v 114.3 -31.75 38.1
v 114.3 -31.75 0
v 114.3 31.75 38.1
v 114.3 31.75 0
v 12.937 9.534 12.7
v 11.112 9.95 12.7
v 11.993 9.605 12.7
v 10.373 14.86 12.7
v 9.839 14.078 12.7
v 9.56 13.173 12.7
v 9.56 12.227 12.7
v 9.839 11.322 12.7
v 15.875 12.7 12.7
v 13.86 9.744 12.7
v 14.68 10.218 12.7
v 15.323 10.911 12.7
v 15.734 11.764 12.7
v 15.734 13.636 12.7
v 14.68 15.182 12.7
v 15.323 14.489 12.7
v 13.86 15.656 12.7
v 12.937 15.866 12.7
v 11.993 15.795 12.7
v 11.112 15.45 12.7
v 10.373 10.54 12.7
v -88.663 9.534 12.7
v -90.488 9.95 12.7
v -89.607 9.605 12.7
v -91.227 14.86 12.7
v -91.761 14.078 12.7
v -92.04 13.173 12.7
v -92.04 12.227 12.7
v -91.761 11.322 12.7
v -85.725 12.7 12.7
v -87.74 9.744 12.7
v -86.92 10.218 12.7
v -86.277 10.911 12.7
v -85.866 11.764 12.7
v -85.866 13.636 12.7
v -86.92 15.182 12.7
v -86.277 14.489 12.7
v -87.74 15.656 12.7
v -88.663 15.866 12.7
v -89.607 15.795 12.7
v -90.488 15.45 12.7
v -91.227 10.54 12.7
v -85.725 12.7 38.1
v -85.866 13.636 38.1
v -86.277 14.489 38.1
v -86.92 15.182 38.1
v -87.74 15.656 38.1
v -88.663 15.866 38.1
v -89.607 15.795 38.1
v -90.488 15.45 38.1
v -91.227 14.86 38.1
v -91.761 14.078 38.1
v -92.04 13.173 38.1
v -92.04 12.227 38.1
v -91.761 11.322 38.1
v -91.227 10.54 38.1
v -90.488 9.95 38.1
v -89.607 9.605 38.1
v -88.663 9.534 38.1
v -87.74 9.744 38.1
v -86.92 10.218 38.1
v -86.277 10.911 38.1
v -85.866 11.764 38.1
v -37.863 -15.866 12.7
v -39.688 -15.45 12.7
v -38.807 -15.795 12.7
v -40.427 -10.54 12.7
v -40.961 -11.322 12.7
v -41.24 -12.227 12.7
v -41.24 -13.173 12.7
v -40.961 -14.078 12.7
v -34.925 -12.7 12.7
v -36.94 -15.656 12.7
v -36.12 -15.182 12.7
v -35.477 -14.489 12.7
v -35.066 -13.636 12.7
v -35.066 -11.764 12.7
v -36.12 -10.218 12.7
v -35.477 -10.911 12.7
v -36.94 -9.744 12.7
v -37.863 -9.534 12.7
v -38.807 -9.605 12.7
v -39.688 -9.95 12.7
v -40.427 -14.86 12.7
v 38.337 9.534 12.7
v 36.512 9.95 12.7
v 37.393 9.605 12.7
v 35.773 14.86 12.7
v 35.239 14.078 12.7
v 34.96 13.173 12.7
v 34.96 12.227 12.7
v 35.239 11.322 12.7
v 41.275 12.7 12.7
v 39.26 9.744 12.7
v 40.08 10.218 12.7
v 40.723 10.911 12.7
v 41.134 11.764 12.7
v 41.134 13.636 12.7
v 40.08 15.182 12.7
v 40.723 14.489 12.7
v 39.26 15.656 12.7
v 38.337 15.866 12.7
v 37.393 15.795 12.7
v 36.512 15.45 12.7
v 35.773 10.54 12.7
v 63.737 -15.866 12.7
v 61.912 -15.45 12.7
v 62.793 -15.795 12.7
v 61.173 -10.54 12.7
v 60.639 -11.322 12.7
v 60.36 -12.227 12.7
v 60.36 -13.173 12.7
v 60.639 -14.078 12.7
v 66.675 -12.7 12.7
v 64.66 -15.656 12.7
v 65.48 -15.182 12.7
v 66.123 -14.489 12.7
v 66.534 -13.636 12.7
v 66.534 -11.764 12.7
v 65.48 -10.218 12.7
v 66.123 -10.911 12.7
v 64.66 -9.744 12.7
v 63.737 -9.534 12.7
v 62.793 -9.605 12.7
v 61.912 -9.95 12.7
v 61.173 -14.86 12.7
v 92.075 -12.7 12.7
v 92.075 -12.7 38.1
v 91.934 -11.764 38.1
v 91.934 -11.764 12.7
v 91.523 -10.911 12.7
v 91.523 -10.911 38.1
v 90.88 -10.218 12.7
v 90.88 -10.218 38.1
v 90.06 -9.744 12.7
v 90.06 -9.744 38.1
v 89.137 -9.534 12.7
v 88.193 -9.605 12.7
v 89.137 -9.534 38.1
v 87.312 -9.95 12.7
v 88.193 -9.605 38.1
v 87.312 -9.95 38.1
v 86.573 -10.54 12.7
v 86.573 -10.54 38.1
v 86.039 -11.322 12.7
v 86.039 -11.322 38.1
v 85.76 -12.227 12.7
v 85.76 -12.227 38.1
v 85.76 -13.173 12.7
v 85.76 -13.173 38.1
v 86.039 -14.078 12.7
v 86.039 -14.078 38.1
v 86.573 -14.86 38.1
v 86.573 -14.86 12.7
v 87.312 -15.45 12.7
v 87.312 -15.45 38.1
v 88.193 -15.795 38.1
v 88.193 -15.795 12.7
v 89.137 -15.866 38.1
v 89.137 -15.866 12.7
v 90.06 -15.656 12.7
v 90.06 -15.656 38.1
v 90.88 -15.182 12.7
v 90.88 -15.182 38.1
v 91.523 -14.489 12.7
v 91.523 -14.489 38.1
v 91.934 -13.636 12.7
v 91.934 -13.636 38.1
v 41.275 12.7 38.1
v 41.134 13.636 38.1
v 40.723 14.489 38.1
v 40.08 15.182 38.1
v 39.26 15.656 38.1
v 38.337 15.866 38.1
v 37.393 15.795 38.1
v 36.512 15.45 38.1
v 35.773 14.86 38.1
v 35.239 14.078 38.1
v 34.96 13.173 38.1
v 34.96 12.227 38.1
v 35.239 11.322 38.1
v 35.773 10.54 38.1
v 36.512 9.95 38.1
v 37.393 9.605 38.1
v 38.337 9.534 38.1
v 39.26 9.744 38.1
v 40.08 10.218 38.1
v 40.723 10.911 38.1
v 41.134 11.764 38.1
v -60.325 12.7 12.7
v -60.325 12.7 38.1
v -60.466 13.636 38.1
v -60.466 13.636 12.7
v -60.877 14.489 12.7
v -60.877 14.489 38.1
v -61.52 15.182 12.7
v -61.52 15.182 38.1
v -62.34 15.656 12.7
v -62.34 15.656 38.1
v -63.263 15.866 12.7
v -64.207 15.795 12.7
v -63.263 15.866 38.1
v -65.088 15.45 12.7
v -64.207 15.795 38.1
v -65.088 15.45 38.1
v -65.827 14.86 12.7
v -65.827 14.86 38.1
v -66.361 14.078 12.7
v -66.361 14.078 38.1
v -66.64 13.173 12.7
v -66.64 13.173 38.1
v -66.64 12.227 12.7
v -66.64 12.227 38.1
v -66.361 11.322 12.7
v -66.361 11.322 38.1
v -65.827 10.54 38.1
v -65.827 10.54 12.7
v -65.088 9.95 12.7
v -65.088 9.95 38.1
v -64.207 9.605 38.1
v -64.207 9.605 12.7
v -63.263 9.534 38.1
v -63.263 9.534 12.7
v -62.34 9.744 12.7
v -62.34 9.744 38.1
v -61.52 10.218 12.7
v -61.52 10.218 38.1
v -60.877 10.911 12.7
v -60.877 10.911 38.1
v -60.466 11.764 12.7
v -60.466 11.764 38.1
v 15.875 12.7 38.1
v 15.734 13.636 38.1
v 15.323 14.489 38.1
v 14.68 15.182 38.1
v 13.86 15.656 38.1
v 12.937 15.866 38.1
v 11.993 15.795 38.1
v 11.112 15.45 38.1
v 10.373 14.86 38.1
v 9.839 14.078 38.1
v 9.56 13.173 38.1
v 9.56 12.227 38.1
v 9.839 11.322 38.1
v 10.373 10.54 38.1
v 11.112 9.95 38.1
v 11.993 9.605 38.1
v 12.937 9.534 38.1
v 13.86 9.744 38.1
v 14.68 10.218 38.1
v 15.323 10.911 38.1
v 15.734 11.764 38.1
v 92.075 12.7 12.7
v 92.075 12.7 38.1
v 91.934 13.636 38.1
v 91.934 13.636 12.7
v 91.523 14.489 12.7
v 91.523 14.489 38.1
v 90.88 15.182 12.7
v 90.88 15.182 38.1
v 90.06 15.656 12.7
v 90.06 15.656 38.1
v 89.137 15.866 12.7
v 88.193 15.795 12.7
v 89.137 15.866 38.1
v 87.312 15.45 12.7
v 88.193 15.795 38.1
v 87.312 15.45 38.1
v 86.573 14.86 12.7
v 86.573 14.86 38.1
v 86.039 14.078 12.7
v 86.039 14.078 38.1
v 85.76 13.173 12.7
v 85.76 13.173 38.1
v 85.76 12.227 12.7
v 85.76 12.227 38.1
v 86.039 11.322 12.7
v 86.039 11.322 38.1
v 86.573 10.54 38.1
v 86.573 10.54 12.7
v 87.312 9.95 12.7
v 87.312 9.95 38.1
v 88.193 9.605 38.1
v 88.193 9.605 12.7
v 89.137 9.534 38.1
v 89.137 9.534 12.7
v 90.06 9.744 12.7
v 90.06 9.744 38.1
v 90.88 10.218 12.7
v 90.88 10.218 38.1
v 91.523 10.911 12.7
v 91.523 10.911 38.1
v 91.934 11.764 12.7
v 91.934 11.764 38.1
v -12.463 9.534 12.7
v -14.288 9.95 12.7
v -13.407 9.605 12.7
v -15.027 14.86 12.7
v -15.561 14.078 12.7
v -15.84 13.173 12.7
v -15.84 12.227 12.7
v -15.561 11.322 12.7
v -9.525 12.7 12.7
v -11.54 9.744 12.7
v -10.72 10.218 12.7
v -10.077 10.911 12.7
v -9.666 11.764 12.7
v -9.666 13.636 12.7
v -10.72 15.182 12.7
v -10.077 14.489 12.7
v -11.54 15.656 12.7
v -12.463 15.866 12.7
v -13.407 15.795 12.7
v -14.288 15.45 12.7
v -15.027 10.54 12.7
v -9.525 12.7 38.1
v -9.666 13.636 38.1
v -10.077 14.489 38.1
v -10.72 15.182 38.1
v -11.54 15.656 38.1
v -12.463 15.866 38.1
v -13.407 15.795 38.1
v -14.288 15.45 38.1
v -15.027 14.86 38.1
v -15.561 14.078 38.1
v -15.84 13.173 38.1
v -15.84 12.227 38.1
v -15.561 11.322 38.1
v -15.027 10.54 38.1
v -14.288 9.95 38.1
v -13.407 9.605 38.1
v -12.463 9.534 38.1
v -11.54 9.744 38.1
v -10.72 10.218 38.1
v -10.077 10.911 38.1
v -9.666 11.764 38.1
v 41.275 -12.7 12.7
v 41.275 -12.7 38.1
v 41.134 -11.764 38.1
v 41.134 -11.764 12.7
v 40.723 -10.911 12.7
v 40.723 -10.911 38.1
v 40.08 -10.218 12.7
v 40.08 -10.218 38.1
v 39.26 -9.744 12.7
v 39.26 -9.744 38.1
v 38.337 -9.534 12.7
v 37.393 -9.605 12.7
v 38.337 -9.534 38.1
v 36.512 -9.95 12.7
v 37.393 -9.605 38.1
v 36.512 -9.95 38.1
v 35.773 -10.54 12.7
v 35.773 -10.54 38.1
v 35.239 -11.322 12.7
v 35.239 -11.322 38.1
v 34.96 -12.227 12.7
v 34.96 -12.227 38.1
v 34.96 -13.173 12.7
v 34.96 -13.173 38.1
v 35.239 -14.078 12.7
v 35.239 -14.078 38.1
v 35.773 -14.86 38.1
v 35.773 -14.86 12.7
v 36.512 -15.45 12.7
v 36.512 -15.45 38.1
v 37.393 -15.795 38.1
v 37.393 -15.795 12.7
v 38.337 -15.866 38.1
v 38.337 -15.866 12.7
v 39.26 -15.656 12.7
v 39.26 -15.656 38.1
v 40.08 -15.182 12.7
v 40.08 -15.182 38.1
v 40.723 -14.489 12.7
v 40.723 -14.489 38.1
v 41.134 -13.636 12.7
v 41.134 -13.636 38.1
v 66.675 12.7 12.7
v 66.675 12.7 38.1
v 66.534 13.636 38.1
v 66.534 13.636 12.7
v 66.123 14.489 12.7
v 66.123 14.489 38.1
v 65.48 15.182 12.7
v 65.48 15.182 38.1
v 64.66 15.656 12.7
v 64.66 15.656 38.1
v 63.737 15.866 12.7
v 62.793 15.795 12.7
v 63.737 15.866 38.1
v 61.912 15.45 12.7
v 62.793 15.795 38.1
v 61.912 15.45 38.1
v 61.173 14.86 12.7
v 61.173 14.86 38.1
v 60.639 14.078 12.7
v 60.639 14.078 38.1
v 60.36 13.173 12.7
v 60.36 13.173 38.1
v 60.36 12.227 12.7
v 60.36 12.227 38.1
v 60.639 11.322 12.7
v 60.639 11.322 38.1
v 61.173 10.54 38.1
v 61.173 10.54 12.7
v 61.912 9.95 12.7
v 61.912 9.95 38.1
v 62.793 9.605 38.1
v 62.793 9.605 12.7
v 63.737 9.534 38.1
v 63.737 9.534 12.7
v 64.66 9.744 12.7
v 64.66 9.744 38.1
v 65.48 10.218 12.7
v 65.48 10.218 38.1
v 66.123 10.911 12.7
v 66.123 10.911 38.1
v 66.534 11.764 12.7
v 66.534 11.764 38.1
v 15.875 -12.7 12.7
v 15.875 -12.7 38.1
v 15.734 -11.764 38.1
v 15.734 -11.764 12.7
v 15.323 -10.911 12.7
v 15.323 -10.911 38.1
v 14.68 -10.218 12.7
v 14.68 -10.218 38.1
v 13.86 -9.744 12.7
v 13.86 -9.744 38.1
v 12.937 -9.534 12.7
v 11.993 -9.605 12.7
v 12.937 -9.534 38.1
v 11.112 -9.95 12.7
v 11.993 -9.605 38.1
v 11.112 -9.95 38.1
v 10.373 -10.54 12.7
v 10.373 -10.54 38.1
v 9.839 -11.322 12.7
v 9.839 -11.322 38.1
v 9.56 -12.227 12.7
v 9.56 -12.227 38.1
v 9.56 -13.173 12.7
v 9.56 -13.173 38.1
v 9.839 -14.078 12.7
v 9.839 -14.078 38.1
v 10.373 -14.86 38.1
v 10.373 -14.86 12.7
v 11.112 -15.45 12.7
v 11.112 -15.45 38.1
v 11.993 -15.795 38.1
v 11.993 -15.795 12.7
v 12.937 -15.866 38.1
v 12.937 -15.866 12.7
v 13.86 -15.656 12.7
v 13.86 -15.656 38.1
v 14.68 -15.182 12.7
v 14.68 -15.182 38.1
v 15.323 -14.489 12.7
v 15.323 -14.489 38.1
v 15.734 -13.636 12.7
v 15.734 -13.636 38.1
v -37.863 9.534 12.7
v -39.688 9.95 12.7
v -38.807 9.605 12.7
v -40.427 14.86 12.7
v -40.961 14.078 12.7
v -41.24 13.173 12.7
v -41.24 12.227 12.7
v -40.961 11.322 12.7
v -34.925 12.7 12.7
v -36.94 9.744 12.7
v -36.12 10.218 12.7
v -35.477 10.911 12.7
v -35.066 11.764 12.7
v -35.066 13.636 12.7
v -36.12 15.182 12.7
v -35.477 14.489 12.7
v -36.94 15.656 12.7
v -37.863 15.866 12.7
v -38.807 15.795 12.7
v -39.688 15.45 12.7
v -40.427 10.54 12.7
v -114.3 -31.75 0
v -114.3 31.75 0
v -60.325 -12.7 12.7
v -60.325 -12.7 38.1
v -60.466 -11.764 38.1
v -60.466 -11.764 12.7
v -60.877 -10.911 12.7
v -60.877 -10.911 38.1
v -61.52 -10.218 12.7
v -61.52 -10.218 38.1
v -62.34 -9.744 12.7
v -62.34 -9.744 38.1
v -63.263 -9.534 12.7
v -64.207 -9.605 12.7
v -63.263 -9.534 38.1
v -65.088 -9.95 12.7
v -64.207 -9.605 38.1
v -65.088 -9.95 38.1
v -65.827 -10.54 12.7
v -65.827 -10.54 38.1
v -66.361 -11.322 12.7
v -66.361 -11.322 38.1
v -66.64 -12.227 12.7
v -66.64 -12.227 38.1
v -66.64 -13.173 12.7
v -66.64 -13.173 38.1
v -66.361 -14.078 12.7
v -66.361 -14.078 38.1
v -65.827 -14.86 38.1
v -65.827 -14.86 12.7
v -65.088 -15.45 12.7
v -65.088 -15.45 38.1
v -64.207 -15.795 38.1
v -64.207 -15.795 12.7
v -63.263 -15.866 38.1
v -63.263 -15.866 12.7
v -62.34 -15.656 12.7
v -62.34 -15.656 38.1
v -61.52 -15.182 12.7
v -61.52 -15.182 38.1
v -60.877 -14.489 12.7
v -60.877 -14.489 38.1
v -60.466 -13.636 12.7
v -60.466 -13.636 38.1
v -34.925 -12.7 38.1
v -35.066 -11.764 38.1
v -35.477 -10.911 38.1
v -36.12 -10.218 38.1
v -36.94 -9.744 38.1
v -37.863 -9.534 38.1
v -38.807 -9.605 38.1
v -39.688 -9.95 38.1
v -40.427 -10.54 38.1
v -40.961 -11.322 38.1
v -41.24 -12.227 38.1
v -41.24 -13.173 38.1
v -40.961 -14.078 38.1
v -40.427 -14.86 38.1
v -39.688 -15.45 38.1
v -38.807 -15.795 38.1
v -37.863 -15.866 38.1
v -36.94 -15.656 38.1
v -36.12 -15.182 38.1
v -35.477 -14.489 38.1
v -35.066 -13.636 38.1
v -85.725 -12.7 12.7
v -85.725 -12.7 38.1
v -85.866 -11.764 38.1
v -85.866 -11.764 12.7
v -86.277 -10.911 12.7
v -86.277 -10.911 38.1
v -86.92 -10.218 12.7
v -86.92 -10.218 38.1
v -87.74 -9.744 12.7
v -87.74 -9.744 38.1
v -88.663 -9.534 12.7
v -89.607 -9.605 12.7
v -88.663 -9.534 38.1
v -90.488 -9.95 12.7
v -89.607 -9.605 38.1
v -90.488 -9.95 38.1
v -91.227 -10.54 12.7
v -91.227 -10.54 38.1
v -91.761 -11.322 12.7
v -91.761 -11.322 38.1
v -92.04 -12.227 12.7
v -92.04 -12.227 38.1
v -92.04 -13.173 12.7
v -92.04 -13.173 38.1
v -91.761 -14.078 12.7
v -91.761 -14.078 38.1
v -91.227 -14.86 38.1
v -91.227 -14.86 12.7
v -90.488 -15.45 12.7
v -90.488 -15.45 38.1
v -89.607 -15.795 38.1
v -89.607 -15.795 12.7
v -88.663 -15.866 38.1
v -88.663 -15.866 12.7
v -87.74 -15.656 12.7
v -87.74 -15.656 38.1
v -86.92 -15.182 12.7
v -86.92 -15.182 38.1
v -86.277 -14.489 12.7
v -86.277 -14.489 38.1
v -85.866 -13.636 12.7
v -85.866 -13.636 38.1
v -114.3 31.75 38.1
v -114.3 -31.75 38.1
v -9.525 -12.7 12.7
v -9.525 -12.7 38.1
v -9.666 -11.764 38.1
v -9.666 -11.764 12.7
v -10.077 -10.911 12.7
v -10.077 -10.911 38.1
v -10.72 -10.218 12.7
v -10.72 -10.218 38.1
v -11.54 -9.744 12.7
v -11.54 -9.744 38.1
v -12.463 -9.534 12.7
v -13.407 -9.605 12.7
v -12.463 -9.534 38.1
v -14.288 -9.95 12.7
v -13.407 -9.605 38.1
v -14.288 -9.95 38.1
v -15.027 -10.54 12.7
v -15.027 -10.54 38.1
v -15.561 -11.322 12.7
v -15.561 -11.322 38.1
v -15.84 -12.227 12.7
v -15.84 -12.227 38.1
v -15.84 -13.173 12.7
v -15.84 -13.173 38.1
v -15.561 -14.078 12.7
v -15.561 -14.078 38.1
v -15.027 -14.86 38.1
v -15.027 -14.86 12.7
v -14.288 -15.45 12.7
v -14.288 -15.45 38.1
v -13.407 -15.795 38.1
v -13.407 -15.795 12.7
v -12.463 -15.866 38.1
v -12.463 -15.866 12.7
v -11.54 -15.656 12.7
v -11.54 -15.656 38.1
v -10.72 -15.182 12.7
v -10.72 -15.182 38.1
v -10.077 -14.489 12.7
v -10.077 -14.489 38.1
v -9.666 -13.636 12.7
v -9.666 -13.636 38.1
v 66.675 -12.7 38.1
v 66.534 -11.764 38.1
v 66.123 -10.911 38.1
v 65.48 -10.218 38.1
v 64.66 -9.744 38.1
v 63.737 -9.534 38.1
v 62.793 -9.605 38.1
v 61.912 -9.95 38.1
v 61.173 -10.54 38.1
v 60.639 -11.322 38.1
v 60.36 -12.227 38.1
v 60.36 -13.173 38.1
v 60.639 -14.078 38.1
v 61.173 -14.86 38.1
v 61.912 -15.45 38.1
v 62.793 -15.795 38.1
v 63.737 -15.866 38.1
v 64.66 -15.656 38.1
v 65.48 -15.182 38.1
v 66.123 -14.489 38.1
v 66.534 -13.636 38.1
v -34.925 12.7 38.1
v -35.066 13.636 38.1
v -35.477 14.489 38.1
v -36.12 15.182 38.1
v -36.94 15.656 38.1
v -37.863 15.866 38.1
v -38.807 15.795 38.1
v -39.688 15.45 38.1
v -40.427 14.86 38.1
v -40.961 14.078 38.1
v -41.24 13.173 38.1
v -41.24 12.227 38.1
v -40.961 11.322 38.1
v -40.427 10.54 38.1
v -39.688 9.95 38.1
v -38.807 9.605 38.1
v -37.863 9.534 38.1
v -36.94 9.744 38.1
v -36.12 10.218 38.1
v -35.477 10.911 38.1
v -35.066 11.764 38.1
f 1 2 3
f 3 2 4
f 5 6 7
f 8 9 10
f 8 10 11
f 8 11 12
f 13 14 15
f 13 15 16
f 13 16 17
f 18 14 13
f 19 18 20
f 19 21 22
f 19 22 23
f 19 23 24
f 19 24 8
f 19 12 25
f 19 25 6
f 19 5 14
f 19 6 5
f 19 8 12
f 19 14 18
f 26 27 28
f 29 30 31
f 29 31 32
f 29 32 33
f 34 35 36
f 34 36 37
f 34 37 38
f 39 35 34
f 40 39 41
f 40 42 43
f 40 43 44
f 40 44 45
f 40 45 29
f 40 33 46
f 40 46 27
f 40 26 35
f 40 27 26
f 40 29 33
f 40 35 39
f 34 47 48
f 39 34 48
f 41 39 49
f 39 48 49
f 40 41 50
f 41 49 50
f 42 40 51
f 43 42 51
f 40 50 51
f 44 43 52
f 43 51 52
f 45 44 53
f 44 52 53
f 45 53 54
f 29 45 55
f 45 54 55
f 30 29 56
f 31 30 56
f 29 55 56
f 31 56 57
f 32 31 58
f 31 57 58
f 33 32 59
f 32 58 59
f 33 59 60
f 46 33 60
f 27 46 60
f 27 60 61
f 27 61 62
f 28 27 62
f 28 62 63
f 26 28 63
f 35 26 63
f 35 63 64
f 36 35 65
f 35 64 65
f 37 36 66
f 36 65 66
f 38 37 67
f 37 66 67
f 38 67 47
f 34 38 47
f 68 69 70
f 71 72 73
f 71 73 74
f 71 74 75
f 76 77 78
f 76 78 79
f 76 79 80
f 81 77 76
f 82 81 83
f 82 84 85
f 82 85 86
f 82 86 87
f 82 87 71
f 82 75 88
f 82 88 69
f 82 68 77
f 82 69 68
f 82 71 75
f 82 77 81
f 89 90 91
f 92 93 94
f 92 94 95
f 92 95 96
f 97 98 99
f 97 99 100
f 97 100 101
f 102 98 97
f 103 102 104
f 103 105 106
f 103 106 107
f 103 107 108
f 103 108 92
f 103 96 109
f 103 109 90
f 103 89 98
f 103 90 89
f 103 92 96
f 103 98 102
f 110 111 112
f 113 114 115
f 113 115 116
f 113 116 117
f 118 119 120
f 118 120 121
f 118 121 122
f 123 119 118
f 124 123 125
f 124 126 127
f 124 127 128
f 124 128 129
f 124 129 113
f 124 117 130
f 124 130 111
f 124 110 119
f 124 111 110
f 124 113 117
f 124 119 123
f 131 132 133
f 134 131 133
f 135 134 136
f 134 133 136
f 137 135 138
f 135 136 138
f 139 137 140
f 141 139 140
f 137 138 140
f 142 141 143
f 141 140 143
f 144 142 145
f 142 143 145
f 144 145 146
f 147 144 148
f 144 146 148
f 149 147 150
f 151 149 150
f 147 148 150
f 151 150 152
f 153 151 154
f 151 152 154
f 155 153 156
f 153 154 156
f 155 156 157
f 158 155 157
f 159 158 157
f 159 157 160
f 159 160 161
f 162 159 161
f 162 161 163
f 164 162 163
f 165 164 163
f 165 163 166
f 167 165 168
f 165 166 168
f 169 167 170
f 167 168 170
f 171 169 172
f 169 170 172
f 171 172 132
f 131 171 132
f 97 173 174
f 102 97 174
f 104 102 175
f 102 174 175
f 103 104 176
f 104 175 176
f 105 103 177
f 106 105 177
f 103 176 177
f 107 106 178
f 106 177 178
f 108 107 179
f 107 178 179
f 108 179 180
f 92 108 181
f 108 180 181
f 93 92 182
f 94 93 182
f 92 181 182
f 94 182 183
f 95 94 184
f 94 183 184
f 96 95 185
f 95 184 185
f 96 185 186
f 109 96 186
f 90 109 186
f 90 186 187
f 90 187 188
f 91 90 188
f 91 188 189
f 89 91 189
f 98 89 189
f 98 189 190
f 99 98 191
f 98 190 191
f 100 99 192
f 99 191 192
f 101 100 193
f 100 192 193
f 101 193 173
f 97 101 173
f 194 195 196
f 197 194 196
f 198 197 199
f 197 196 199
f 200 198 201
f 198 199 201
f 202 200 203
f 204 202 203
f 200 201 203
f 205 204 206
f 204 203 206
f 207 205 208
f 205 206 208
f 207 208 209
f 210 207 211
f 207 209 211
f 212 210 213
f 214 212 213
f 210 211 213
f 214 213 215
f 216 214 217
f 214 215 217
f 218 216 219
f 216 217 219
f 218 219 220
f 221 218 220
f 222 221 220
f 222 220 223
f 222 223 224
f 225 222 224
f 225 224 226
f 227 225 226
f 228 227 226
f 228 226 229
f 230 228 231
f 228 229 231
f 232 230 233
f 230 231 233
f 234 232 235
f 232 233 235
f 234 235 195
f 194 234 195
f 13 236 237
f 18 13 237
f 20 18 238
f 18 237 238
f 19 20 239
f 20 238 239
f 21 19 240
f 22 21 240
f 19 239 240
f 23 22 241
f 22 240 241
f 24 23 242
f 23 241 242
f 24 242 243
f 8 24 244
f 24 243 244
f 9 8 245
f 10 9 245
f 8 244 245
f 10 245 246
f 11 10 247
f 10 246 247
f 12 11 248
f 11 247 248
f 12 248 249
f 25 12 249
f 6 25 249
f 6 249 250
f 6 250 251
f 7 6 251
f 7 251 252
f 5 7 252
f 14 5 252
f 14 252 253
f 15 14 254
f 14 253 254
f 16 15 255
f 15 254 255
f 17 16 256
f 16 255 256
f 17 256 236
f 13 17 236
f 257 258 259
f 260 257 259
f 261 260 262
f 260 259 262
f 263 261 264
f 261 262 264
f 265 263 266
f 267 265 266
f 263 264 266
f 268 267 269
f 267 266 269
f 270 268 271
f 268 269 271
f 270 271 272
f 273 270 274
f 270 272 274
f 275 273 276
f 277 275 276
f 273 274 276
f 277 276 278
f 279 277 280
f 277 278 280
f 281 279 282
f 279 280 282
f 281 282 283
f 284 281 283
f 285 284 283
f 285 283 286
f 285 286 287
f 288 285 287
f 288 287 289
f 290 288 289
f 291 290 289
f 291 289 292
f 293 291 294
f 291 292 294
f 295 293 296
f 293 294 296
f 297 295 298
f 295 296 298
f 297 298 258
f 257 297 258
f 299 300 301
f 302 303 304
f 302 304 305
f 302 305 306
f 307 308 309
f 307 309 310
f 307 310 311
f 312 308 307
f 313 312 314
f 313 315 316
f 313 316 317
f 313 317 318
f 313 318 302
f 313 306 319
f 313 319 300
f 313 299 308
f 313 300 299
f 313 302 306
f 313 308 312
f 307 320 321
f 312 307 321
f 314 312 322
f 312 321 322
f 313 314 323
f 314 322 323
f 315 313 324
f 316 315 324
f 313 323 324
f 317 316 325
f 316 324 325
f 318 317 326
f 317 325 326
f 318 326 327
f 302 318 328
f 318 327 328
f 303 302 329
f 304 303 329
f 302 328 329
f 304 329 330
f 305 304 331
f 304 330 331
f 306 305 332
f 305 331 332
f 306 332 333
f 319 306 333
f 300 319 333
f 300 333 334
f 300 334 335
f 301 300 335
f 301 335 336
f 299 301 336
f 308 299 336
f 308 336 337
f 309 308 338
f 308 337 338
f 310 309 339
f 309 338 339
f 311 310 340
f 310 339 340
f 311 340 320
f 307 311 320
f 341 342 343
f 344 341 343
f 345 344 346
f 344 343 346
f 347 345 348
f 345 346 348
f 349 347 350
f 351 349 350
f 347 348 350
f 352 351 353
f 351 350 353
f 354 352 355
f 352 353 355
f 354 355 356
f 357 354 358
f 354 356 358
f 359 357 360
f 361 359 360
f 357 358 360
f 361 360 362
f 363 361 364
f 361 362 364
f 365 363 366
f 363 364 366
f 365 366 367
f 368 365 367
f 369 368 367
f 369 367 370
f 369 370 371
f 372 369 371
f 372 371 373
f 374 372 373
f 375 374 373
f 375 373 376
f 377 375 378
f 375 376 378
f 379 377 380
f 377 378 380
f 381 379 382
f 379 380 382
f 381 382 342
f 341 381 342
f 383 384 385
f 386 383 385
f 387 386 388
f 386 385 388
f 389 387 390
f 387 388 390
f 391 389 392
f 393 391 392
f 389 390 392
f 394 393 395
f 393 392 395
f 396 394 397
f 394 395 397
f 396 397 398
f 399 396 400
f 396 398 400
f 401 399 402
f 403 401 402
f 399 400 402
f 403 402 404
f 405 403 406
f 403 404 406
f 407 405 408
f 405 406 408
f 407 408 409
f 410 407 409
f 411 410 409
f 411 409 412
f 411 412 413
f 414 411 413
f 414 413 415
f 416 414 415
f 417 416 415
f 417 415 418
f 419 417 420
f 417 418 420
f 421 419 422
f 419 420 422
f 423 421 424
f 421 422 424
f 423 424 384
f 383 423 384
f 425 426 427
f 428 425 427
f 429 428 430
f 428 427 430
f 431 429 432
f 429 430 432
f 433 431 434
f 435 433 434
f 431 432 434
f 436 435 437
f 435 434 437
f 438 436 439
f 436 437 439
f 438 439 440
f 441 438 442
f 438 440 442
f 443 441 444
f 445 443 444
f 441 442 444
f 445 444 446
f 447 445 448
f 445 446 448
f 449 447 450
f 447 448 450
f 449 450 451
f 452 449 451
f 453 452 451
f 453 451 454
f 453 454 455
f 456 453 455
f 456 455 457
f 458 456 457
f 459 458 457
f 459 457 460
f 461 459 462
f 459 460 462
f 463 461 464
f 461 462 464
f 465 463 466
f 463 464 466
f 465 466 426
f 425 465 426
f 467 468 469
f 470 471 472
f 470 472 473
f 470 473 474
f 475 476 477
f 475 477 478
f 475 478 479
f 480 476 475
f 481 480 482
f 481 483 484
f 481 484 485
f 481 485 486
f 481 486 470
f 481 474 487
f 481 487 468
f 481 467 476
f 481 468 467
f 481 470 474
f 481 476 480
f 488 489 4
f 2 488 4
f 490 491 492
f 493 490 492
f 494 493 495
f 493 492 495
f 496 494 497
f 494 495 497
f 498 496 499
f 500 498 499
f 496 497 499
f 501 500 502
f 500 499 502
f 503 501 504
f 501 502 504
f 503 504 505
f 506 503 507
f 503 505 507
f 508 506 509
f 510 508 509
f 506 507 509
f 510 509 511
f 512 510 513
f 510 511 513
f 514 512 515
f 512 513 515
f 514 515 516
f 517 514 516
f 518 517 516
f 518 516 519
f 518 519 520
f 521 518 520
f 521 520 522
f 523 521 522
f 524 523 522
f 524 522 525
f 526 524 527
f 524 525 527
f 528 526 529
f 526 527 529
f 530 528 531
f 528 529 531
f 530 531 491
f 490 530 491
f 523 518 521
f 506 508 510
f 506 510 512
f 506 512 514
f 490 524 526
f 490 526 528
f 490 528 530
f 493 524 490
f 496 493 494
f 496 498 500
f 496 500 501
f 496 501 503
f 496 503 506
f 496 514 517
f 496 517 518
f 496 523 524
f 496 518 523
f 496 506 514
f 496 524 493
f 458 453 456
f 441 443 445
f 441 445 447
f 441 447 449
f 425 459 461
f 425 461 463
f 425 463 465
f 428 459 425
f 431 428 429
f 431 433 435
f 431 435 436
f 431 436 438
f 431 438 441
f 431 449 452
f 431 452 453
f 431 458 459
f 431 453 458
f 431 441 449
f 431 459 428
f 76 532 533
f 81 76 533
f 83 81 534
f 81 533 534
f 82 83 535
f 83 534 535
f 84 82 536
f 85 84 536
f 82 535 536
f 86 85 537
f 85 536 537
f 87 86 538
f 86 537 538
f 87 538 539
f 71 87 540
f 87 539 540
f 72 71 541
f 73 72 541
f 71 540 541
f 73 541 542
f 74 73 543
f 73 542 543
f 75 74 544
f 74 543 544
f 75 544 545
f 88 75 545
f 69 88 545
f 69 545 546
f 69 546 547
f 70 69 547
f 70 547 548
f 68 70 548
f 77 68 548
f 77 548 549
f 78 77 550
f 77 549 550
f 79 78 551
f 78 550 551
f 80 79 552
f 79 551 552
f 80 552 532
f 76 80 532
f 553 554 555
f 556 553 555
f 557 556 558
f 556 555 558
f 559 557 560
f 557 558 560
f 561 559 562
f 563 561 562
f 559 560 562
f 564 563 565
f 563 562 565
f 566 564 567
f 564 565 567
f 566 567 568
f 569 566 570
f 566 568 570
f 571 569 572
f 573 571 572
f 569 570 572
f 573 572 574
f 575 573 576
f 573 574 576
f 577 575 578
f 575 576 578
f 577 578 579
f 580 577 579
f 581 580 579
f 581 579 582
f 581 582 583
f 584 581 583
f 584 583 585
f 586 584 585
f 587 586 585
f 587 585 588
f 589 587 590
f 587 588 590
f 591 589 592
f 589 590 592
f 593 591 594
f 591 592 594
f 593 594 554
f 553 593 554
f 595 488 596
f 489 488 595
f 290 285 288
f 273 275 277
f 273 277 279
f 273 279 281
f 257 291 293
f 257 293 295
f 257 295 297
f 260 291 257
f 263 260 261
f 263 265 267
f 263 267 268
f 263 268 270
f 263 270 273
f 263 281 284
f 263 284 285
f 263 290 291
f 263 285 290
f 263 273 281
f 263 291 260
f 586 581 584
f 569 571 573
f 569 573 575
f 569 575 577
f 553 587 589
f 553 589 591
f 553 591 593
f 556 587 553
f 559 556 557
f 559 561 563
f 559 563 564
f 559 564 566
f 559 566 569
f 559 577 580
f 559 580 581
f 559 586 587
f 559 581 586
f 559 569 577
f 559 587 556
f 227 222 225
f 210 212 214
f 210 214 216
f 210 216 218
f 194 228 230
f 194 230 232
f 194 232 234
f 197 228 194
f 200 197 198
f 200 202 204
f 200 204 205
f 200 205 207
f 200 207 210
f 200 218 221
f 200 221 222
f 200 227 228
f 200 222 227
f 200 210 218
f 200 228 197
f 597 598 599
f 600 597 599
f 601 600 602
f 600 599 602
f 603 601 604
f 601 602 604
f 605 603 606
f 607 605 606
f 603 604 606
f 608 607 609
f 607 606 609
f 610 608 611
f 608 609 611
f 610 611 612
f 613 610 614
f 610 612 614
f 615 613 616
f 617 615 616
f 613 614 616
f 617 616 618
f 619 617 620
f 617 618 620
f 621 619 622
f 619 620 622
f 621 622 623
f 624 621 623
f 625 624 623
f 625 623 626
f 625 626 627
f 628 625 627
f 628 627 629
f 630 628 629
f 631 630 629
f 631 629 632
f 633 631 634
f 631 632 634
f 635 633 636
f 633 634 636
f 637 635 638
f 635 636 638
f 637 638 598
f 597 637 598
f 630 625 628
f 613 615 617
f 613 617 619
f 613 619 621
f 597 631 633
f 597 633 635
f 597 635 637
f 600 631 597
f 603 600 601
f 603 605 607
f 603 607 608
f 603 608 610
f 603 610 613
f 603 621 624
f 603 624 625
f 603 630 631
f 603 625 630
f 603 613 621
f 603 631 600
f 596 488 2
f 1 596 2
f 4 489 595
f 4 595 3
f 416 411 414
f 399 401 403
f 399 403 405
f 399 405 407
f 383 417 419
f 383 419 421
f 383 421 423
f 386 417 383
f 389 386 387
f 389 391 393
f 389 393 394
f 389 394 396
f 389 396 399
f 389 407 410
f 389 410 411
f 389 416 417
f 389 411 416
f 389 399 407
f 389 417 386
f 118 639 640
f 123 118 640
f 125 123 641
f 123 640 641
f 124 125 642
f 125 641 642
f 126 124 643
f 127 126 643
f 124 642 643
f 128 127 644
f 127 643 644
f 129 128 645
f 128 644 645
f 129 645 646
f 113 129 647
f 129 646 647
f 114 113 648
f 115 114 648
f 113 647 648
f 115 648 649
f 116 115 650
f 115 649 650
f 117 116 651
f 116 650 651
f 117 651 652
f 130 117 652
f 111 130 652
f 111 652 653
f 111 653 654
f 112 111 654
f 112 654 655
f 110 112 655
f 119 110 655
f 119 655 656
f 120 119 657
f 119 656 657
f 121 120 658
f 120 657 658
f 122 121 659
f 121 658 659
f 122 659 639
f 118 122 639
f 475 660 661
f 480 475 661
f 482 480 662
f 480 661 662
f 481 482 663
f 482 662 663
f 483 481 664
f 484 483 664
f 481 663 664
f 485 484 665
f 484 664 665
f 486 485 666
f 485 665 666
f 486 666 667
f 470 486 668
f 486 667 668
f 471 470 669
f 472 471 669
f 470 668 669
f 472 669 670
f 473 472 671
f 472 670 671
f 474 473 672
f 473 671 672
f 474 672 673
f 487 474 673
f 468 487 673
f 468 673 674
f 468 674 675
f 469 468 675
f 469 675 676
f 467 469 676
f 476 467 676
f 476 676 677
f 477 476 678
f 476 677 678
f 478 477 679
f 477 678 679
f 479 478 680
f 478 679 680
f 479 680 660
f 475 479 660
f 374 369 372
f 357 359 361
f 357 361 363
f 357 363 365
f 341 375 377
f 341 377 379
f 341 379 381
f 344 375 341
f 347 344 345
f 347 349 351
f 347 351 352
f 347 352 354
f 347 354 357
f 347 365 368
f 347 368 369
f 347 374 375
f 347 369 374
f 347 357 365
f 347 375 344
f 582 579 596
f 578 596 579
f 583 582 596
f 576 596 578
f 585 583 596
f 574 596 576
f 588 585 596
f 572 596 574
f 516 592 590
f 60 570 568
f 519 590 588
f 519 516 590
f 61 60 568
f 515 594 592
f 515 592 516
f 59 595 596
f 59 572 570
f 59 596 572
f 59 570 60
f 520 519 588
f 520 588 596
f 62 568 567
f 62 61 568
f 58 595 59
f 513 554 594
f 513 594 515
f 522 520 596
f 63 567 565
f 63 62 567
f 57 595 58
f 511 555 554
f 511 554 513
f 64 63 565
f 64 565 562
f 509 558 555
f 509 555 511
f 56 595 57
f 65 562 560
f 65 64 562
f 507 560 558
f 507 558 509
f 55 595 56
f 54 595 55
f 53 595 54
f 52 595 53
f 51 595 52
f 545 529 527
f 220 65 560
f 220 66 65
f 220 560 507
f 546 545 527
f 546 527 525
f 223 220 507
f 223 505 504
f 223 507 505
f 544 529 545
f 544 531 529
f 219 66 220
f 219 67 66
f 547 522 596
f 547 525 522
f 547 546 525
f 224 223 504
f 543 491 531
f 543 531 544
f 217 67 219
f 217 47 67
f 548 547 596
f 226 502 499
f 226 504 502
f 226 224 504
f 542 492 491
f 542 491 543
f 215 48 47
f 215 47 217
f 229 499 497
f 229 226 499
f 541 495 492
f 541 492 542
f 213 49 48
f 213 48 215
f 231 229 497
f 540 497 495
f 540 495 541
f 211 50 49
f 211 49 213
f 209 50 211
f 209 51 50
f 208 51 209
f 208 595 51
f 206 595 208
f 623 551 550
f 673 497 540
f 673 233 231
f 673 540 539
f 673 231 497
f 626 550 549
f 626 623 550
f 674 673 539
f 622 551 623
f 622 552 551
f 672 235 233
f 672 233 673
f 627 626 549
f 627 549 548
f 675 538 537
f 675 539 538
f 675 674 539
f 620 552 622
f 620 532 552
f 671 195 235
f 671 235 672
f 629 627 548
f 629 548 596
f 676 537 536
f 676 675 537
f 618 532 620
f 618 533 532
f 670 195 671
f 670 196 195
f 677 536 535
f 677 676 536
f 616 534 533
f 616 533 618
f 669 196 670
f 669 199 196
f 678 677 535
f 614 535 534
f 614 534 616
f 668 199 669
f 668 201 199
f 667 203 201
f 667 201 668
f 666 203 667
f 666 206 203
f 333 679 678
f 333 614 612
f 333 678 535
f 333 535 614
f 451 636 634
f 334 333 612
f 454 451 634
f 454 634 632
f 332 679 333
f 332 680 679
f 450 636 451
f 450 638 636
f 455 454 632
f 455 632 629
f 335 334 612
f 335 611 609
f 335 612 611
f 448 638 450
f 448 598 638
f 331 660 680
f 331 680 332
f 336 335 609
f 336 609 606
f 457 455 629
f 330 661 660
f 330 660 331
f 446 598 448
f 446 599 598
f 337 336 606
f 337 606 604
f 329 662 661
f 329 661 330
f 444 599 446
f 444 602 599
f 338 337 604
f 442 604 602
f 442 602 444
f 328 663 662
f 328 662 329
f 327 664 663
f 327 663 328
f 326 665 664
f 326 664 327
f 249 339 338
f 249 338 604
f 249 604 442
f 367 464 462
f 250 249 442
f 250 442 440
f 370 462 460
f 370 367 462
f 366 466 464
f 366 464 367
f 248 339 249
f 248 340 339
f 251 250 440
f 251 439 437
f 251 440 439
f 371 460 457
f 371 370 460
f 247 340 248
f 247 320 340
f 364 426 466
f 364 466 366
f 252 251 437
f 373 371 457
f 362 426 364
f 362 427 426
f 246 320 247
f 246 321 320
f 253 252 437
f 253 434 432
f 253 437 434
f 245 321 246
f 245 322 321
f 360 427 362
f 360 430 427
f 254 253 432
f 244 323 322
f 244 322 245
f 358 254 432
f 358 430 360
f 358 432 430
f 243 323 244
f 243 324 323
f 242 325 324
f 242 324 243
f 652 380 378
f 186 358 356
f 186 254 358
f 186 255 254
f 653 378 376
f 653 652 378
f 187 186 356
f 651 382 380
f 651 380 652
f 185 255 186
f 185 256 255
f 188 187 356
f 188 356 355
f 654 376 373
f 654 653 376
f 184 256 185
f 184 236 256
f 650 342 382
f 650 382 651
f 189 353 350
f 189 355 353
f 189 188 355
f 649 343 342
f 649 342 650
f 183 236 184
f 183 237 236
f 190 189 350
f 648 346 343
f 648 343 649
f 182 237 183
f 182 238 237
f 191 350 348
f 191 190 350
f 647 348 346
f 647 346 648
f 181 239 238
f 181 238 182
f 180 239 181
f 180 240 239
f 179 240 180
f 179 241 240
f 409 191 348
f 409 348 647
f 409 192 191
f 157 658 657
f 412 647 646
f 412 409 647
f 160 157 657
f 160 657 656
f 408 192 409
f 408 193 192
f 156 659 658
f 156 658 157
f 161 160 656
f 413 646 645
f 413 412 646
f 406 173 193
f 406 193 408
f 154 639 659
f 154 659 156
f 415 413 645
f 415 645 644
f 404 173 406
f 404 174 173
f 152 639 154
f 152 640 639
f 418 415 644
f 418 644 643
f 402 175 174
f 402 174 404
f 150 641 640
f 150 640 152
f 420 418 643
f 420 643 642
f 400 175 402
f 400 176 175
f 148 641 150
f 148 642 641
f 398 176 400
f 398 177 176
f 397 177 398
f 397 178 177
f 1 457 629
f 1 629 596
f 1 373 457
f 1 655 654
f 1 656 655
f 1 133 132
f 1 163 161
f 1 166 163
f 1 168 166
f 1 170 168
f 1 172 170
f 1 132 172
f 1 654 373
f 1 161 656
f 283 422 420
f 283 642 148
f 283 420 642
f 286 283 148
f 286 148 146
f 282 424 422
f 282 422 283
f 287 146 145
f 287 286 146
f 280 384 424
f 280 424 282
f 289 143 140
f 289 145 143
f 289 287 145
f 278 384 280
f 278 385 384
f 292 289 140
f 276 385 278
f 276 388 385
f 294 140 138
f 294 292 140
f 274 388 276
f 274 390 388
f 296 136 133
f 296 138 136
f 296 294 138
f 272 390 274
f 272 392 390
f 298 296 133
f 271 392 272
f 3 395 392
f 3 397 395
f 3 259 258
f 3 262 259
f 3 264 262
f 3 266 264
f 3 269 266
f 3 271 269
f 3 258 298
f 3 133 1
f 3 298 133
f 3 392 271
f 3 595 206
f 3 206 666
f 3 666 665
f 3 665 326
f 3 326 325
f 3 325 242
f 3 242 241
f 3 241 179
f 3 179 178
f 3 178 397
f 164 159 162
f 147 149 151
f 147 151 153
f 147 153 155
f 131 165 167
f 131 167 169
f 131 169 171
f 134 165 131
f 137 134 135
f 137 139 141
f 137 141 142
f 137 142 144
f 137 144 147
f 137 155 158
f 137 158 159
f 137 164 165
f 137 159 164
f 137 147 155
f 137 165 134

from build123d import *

# Parameters (mm, degrees)
F0_W     = 228.6
F0_H     = 63.5
F1_DEPTH = 38.1
F2_R     = 3.175
F3_DEPTH = 25.4


with BuildPart() as f1:
    # F0 (on Top) → F1 (new body)
    with BuildSketch(Plane.XY):
        Rectangle(F0_W, F0_H)
    extrude(amount=F1_DEPTH)

    # F2 (on face) → F3 (cut)
    with BuildSketch(Plane.XY.offset(38.1)):
        with Locations((-88.9, -12.7)):
            Circle(F2_R)
        with Locations((-88.9, 12.7)):
            Circle(F2_R)
        with Locations((-63.5, -12.7)):
            Circle(F2_R)
        with Locations((-63.5, 12.7)):
            Circle(F2_R)
        with Locations((-38.1, -12.7)):
            Circle(F2_R)
        with Locations((-38.1, 12.7)):
            Circle(F2_R)
        with Locations((-12.7, -12.7)):
            Circle(F2_R)
        with Locations((-12.7, 12.7)):
            Circle(F2_R)
        with Locations((12.7, -12.7)):
            Circle(F2_R)
        with Locations((12.7, 12.7)):
            Circle(F2_R)
        with Locations((38.1, -12.7)):
            Circle(F2_R)
        with Locations((38.1, 12.7)):
            Circle(F2_R)
        with Locations((63.5, -12.7)):
            Circle(F2_R)
        with Locations((63.5, 12.7)):
            Circle(F2_R)
        with Locations((88.9, -12.7)):
            Circle(F2_R)
        with Locations((88.9, 12.7)):
            Circle(F2_R)
    extrude(amount=-F3_DEPTH, mode=Mode.SUBTRACT)


solid = f1.part
